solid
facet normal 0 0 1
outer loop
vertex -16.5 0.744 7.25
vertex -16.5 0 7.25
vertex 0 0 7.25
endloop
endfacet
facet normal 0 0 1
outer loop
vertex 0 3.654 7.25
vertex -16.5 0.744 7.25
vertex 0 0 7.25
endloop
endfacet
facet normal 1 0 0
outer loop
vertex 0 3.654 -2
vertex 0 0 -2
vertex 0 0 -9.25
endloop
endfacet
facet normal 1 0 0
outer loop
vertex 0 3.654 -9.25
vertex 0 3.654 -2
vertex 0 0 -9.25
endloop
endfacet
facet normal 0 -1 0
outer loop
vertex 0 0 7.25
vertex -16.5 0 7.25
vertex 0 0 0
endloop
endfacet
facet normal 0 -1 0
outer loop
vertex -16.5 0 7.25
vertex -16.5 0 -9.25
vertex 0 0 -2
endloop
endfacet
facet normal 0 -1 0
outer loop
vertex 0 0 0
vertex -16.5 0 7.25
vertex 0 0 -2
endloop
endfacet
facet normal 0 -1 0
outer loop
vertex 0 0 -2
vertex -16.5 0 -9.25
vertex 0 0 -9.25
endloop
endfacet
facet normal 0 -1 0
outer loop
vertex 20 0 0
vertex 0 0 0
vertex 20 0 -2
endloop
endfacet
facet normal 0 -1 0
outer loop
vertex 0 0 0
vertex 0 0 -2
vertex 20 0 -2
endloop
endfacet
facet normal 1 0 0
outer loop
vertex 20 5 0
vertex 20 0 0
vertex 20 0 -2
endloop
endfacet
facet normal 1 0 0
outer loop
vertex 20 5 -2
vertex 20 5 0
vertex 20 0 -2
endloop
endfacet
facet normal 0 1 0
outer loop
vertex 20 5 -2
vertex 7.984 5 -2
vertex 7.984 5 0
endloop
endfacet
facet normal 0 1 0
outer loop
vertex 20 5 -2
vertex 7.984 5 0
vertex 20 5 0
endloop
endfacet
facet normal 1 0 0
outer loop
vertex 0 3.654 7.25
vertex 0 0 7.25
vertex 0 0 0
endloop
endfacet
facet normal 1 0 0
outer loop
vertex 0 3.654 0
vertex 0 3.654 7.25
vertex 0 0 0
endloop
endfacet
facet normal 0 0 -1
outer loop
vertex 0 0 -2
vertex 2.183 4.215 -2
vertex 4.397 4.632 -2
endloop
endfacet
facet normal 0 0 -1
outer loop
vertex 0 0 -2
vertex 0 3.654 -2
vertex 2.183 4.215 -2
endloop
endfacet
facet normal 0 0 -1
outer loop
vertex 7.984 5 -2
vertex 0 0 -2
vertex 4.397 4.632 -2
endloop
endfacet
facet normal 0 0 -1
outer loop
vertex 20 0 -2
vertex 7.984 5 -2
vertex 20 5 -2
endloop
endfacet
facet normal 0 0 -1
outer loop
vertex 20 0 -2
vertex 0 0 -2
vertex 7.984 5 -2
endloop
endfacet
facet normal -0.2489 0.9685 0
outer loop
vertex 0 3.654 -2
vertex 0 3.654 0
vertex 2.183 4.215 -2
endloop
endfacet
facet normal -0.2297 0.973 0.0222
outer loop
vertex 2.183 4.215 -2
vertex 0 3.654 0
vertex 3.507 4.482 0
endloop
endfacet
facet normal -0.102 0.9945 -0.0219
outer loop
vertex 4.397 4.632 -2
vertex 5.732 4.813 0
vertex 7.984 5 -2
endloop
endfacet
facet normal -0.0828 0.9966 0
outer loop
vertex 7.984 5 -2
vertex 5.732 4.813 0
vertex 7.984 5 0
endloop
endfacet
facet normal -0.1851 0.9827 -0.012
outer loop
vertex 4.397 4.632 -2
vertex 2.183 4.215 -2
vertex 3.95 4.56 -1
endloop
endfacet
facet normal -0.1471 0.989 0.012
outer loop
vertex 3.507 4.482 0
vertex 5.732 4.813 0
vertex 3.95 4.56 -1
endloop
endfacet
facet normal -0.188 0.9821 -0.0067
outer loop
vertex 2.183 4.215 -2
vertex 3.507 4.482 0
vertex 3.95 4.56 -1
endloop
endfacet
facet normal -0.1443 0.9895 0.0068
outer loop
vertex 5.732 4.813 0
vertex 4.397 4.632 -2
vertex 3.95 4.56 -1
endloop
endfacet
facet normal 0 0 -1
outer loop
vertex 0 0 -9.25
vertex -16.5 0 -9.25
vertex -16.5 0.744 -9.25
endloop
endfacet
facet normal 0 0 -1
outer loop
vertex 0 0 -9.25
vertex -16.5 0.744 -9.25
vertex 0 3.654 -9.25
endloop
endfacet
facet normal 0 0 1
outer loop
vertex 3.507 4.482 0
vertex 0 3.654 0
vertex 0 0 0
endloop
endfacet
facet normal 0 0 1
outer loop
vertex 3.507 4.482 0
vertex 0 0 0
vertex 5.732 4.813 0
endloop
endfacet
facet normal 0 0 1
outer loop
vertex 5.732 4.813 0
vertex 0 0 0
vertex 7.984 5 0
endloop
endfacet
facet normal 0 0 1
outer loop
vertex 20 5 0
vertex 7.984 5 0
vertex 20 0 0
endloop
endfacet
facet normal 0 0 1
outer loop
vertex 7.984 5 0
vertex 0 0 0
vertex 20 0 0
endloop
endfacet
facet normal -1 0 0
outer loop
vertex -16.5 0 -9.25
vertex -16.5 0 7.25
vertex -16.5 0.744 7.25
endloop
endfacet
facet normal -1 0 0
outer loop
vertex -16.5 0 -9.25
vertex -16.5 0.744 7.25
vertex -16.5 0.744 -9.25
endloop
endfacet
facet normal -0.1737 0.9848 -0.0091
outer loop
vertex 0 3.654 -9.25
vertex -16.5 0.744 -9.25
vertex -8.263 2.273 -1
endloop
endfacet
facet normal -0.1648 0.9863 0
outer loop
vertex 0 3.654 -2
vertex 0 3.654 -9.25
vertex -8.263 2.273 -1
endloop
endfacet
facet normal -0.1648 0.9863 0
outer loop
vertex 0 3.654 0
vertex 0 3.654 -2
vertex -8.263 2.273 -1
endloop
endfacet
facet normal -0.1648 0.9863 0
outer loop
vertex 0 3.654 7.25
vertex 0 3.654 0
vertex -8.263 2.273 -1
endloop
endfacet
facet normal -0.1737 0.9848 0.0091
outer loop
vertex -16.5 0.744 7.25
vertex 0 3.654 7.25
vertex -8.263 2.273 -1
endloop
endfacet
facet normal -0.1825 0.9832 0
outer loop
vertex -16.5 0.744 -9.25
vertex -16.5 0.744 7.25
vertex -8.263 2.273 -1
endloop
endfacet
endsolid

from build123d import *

# Parameters (mm, degrees)
ESQUISSE2_W             = 20
ESQUISSE2_H             = 2
ESQUISSE2_W_2           = 16.5
ESQUISSE2_H_2           = 16.5
BOSS_EXTRU_1_DEPTH      = 5
ENL_V_MAT_EXTRU_1_DEPTH = 17
ENL_V_MAT_EXTRU_2_DEPTH = 17


with BuildPart() as part:
    # Esquisse2 → Boss.-Extru.1 (new body)
    with BuildSketch(Plane(origin=(0, 0, 0), x_dir=(1, 0, 0), z_dir=(0, 1, 0))):
        with Locations((10, 1)):
            Rectangle(ESQUISSE2_W, ESQUISSE2_H)
        with Locations((-8.25, 1)):
            Rectangle(ESQUISSE2_W_2, ESQUISSE2_H_2)
    extrude(amount=BOSS_EXTRU_1_DEPTH)

    # Esquisse3 → Enlèv. mat.-Extru.1 (cut)
    with BuildSketch(Plane(origin=(0, 0, -9.25), x_dir=(-1, 0, 0), z_dir=(0, 0, -1))):
        with BuildLine():
            Line((0, 5), (0, 3.654066972))
            add(Edge.make_bspline(
                [(0, 3.654066972), (8.276287375, 2.347006327), (16.5, 0.744396355)],
                knots=[0, 0, 0, 1, 1, 1], degree=2))
            Line((16.5, 0.744396355), (18.688542218, 4.20494166))
            Line((18.688542218, 4.20494166), (16.723031274, 6.238601979))
            Line((16.723031274, 6.238601979), (3.598874135, 6.46224909))
            Line((3.598874135, 6.46224909), (0, 5))
        make_face()
    extrude(amount=-ENL_V_MAT_EXTRU_1_DEPTH, mode=Mode.SUBTRACT)

    # Esquisse4 → Enlèv. mat.-Extru.2 (cut)
    with BuildSketch(Plane.XY):
        with BuildLine():
            Line((0, 3.654066972), (0, 5))
            Line((0, 5), (7.983599521, 5))
            add(Edge.make_bspline(
                [(0, 3.654066972), (3.907893525, 4.793033974), (7.983599521, 5)],
                knots=[0, 0, 0, 1, 1, 1], degree=2))
        make_face()
    extrude(amount=-ENL_V_MAT_EXTRU_2_DEPTH, mode=Mode.SUBTRACT)


solid = part.part
